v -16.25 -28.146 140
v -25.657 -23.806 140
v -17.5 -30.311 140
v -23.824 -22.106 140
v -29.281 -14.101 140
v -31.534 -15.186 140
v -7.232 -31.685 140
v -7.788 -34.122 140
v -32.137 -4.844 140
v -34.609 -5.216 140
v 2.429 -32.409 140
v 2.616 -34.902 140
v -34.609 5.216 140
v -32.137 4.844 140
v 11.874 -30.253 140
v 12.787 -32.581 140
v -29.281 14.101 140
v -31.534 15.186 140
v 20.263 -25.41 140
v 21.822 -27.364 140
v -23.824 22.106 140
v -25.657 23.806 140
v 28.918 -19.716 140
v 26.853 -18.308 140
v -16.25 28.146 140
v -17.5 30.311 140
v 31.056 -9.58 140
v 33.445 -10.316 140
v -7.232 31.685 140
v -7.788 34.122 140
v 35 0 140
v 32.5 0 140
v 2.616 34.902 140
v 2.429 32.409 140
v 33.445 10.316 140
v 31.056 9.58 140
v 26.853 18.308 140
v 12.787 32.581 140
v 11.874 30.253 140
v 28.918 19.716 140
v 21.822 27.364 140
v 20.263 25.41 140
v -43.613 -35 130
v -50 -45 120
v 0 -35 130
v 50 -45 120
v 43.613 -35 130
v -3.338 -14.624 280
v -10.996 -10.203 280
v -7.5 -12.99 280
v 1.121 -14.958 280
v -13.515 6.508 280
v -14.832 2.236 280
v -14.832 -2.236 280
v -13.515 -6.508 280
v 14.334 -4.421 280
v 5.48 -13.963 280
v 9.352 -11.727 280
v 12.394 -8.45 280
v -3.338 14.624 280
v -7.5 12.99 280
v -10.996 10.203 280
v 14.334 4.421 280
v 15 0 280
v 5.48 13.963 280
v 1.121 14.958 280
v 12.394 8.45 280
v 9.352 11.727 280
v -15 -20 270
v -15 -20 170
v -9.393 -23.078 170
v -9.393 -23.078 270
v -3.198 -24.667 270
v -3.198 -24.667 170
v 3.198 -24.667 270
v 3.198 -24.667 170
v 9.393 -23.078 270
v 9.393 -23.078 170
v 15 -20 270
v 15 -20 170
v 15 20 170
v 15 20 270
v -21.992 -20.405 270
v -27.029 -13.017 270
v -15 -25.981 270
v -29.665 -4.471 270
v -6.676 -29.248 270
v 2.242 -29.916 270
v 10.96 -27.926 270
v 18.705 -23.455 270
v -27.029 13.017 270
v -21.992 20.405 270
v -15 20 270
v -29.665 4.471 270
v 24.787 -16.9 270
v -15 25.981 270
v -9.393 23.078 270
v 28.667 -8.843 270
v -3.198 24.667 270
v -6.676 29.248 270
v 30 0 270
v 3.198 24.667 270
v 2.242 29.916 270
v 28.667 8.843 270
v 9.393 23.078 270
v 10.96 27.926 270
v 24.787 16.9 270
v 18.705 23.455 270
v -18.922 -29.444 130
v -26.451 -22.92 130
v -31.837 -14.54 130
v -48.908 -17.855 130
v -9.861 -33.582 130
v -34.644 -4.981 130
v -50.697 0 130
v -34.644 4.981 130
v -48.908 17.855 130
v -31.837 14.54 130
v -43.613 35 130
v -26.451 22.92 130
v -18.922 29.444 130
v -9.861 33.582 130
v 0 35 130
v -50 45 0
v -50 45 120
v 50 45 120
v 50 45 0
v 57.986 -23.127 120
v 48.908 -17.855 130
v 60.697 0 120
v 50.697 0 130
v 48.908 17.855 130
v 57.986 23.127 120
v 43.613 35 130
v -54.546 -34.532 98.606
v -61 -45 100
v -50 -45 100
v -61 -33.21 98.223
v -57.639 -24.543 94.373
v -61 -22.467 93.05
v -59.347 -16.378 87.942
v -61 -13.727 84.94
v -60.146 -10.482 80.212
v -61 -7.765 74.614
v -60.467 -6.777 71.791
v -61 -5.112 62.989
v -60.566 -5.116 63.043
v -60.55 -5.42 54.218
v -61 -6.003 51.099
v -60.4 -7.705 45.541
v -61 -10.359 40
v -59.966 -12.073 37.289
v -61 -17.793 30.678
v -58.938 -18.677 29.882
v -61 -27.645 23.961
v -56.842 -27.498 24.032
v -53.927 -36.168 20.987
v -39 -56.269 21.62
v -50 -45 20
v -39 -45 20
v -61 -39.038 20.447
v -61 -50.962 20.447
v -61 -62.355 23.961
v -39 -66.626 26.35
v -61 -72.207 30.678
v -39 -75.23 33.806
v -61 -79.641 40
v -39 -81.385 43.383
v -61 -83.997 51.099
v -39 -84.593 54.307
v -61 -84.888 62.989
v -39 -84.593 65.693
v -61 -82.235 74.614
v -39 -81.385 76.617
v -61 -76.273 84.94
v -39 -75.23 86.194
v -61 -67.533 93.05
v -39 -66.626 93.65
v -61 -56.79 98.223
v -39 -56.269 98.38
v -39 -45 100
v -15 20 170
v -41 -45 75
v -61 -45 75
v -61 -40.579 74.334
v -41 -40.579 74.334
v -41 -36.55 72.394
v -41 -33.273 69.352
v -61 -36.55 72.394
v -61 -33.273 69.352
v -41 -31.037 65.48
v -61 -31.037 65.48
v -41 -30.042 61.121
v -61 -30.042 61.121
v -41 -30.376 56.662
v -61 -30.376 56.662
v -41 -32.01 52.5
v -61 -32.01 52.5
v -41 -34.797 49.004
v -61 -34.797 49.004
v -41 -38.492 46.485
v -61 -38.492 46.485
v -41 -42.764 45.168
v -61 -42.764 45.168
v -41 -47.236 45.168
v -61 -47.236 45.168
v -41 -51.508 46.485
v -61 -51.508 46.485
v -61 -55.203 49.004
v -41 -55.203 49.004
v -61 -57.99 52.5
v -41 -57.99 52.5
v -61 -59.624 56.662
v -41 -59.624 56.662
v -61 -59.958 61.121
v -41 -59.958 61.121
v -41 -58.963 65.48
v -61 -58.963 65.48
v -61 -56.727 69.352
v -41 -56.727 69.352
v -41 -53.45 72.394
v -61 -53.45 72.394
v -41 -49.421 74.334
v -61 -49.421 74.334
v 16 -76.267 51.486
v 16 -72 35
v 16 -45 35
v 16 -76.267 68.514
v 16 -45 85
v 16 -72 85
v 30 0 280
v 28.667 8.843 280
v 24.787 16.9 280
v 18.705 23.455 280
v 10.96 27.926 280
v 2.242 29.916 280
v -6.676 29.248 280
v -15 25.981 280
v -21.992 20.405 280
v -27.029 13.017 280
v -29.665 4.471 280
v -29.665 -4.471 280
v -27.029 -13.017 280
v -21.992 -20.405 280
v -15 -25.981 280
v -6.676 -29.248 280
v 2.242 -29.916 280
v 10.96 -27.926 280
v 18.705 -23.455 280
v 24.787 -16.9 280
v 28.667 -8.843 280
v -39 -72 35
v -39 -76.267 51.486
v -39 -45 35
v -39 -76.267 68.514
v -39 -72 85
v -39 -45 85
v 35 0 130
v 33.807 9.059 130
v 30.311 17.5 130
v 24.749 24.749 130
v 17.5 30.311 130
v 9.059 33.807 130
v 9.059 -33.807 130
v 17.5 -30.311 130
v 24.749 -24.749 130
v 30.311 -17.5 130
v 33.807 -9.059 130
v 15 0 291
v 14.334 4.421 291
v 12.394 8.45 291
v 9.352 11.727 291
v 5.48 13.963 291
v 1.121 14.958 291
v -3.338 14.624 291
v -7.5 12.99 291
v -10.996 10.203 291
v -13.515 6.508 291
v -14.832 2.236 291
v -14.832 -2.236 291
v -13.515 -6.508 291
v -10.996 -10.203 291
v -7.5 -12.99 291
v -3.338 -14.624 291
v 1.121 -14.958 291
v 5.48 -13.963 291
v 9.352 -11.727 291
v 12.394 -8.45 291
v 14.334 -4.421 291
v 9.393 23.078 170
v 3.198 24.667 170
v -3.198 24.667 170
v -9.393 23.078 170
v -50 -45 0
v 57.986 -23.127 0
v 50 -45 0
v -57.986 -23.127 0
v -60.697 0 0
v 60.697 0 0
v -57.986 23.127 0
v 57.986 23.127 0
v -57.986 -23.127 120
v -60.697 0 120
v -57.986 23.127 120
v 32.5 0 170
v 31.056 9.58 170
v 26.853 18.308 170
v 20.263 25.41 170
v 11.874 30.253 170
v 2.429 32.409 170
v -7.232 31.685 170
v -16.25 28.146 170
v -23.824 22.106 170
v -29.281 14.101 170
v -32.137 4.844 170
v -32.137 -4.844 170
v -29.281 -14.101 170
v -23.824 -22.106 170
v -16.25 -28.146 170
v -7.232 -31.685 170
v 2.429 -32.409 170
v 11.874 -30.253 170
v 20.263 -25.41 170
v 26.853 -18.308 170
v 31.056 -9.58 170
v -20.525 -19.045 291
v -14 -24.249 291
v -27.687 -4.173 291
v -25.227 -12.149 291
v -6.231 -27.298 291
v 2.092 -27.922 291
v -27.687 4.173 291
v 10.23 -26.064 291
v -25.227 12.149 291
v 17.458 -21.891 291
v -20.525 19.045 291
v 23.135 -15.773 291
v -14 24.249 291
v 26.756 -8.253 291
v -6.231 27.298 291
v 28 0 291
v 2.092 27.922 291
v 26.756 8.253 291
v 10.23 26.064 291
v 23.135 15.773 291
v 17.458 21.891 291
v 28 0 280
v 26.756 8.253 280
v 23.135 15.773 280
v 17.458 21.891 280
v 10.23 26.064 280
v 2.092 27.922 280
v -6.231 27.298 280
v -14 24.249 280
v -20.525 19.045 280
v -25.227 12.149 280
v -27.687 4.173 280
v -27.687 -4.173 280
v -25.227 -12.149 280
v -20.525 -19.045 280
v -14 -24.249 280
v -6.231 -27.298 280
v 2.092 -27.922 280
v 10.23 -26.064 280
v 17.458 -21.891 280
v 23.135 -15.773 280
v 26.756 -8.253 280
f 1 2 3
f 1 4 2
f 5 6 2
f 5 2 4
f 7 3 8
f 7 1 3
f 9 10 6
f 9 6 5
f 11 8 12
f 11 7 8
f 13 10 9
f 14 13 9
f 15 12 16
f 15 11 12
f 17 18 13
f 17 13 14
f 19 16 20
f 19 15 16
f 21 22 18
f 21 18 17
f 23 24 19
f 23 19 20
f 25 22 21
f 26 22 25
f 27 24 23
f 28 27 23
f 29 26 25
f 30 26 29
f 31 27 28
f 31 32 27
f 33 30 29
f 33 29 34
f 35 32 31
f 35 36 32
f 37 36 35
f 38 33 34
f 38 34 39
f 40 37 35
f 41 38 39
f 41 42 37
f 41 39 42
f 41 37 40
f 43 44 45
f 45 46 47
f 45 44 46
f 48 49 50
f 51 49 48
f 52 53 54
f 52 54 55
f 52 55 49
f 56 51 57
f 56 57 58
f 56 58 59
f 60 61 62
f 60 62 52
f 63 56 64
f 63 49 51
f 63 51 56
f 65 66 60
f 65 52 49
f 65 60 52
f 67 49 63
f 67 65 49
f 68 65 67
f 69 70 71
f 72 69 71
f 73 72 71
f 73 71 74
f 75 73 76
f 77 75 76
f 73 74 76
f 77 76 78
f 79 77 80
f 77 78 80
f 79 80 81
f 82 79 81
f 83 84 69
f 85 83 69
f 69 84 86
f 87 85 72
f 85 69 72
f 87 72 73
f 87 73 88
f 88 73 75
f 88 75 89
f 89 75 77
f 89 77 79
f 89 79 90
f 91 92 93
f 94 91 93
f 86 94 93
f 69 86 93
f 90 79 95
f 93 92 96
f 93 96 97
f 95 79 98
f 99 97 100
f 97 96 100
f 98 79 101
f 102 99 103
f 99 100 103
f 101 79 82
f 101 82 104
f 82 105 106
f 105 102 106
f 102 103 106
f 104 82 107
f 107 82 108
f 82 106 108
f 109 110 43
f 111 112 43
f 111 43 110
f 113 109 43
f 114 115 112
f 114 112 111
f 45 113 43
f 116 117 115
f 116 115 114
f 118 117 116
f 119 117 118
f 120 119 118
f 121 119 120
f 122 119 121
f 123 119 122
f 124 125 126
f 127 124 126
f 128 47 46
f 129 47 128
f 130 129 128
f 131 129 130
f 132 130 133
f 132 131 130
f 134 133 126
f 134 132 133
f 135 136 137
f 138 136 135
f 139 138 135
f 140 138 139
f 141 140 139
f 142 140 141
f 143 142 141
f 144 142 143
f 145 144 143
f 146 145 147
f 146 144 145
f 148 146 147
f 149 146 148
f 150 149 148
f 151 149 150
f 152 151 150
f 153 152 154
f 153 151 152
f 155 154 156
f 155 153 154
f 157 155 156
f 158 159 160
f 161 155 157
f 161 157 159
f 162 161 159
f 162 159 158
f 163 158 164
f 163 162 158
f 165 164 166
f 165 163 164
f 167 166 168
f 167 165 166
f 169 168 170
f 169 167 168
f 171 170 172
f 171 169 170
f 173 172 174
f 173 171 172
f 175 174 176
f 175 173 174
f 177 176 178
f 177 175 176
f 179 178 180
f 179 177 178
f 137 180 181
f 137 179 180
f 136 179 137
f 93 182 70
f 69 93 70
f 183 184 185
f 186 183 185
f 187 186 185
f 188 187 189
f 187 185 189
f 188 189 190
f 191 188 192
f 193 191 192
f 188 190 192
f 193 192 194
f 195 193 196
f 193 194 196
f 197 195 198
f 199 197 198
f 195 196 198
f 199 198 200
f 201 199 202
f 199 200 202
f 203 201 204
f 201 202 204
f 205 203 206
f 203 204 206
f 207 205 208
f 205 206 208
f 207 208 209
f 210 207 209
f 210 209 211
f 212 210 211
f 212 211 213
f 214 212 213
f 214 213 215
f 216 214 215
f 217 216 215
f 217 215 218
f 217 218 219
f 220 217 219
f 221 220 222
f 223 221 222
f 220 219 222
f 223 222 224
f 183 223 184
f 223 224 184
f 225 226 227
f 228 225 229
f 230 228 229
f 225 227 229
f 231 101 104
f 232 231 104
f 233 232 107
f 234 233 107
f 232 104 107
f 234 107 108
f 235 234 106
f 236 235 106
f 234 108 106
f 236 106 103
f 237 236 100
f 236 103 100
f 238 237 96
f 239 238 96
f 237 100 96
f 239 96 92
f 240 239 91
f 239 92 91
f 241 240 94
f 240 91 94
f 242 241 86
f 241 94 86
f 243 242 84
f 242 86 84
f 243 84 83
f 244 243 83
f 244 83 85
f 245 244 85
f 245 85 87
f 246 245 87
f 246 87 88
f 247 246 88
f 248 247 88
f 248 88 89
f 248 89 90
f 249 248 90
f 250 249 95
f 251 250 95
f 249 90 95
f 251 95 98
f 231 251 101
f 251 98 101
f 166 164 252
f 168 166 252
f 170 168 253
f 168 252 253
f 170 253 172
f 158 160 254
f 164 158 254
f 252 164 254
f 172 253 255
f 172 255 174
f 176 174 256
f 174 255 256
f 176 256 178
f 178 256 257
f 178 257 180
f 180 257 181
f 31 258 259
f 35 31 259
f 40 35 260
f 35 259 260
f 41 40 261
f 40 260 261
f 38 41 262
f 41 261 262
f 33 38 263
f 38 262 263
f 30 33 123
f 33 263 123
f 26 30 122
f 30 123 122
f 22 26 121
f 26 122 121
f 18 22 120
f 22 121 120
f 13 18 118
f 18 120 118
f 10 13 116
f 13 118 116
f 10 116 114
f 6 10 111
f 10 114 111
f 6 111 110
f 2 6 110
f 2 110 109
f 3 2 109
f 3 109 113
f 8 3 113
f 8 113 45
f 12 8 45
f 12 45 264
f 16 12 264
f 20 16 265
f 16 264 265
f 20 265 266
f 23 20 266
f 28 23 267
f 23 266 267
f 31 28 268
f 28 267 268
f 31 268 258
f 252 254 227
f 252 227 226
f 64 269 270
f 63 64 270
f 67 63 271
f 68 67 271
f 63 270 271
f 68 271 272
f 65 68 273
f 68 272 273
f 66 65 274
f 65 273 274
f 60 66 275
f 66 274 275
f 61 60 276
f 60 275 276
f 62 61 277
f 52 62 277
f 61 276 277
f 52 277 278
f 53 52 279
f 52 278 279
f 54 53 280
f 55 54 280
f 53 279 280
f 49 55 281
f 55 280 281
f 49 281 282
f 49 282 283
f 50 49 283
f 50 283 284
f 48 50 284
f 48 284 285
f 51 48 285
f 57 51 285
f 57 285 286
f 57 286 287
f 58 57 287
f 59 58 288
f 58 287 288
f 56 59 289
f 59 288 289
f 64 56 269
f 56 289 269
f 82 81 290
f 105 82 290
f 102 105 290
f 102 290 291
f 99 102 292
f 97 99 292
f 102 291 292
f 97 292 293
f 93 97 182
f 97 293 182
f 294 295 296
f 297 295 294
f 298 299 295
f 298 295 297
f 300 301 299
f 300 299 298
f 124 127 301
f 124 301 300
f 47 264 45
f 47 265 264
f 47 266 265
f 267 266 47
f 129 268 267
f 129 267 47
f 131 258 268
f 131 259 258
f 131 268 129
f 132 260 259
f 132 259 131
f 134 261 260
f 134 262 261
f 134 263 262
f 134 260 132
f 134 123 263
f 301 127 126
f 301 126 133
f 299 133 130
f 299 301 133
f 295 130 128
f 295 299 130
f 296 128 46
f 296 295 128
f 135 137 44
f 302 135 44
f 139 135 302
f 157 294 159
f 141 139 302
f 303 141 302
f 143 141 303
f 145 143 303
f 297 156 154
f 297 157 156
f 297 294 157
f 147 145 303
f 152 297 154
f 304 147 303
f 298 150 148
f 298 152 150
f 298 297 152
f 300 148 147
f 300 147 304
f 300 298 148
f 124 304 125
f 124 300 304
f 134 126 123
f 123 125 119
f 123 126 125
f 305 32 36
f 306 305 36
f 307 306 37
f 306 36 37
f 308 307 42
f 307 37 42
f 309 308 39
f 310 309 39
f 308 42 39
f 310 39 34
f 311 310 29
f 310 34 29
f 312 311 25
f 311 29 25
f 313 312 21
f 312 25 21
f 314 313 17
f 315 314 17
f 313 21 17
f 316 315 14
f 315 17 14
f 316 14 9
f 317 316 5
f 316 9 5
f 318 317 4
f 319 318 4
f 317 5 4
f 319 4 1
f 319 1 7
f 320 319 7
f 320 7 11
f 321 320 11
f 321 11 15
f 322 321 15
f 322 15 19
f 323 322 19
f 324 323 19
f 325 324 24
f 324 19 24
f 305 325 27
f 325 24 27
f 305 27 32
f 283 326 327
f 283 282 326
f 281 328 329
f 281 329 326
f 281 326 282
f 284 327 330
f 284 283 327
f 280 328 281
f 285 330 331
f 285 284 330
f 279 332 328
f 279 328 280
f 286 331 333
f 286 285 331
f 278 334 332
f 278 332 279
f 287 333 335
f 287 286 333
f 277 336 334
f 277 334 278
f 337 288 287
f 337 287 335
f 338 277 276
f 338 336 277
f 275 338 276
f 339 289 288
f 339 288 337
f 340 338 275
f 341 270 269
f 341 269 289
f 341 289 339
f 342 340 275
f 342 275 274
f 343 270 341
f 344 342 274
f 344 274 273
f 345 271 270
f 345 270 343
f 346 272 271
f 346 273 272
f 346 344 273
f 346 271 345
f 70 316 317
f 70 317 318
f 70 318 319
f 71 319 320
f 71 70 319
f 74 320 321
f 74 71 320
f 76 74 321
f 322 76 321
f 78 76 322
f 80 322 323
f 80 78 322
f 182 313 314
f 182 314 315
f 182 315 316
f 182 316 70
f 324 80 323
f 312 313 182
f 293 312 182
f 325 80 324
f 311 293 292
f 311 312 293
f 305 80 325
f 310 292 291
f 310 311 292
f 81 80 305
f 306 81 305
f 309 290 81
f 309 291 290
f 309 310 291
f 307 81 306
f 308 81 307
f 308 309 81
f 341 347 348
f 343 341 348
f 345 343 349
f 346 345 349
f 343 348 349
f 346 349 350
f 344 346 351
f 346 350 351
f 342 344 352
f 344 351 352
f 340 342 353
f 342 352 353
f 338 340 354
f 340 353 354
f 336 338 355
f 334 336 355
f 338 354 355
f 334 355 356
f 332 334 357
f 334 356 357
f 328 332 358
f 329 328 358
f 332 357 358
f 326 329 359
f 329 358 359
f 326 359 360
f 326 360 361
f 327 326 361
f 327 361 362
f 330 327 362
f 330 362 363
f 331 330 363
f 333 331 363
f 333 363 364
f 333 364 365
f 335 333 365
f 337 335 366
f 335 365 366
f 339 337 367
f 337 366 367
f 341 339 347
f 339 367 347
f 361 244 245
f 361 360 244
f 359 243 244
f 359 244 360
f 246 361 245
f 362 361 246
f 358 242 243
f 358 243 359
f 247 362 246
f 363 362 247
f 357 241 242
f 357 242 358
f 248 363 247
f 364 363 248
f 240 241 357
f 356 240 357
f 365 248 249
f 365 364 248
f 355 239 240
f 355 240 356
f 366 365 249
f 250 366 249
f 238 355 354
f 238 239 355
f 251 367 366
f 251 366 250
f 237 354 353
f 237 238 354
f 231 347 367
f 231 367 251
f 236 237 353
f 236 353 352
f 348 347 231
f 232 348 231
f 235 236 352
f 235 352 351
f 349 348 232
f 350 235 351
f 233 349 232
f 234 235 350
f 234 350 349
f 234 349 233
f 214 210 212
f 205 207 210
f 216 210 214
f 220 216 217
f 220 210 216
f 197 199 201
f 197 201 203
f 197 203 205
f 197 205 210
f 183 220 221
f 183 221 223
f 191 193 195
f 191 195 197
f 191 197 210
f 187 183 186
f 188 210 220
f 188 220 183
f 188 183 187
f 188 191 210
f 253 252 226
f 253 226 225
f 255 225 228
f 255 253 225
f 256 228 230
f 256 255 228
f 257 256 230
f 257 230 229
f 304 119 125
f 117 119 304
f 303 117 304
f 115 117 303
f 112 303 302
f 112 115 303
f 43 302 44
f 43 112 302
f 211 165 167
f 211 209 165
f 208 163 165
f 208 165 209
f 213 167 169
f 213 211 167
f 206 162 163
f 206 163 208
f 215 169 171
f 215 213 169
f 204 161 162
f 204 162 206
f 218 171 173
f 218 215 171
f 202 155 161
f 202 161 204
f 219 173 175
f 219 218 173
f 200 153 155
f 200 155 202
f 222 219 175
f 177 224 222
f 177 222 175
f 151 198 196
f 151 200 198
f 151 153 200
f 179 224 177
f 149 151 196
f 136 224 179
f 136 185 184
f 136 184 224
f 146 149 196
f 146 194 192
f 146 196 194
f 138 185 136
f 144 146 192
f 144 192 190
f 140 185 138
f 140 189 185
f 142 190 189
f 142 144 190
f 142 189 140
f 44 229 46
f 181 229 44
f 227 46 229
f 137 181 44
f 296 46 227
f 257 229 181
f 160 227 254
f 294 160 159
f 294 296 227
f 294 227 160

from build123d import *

# Parameters (mm, degrees)
BOSS_EXTRUDE1_DEPTH = 120
BOSS_EXTRUDE2_DEPTH = 10
BOSS_EXTRUDE2_TAPER = 45
SKETCH3_R           = 35
BOSS_EXTRUDE3_DEPTH = 10
SKETCH4_R           = 32.5
BOSS_EXTRUDE4_DEPTH = 30
BOSS_EXTRUDE5_DEPTH = 100
SKETCH6_R           = 30
BOSS_EXTRUDE6_DEPTH = 10
SKETCH7_R           = 28
BOSS_EXTRUDE7_DEPTH = 11
SKETCH8_R           = 40
BOSS_EXTRUDE8_DEPTH = 11
BOSS_EXTRUDE9_DEPTH = 55
SKETCH10_R          = 15
CUT_EXTRUDE1_DEPTH  = 11
SKETCH11_R          = 15
CUT_EXTRUDE2_DEPTH  = 20


with BuildPart() as part:
    # Sketch1 → Boss-Extrude1 (new body)
    with BuildSketch(Plane.XY):
        with BuildLine():
            Line((-50, 45), (50, 45))
            ThreePointArc((50, 45), (60.697144503, 0), (50, -45))
            Line((50, -45), (-50, -45))
            ThreePointArc((-50, -45), (-60.697144503, 0), (-50, 45))
        make_face()
    extrude(amount=BOSS_EXTRUDE1_DEPTH)

    # Sketch2 → Boss-Extrude2 (add)
    with BuildSketch(Plane.XY.offset(120)):
        with BuildLine():
            Line((-50, -45), (50, -45))
            ThreePointArc((50, -45), (60.697144503, 0), (50, 45))
            Line((50, 45), (-50, 45))
            ThreePointArc((-50, 45), (-60.697144503, 0), (-50, -45))
        make_face()
    extrude(amount=BOSS_EXTRUDE2_DEPTH, taper=BOSS_EXTRUDE2_TAPER)

    # Sketch3 → Boss-Extrude3 (add)
    with BuildSketch(Plane.XY.offset(130)):
        Circle(SKETCH3_R)
    extrude(amount=BOSS_EXTRUDE3_DEPTH)

    # Sketch4 → Boss-Extrude4 (add)
    with BuildSketch(Plane.XY.offset(140)):
        Circle(SKETCH4_R)
    extrude(amount=BOSS_EXTRUDE4_DEPTH)

    # Sketch5 → Boss-Extrude5 (add)
    with BuildSketch(Plane.XY.offset(170)):
        with BuildLine():
            Line((-15, 20), (-15, -20))
            ThreePointArc((-15, -20), (0, -24.86796738), (15, -20))
            Line((15, -20), (15, 20))
            ThreePointArc((15, 20), (0, 24.86796738), (-15, 20))
        make_face()
    extrude(amount=BOSS_EXTRUDE5_DEPTH)

    # Sketch6 → Boss-Extrude6 (add)
    with BuildSketch(Plane.XY.offset(270)):
        Circle(SKETCH6_R)
    extrude(amount=BOSS_EXTRUDE6_DEPTH)

    # Sketch7 → Boss-Extrude7 (add)
    with BuildSketch(Plane.XY.offset(280)):
        Circle(SKETCH7_R)
    extrude(amount=BOSS_EXTRUDE7_DEPTH)

    # Sketch8 → Boss-Extrude8 (add, symmetric)
    with BuildSketch(Plane.ZY.offset(50)):
        with Locations((60, -45)):
            Circle(SKETCH8_R)
    extrude(amount=BOSS_EXTRUDE8_DEPTH, both=True)

    # Sketch9 → Boss-Extrude9 (add)
    with BuildSketch(Plane(origin=(-39, 0, 0), x_dir=(0, 0, -1), z_dir=(1, 0, 0))):
        with BuildLine():
            Line((-85, -45), (-35, -45))
            Line((-35, -45), (-35, -72))
            ThreePointArc((-35, -72), (-60, -76.80636081), (-85, -72))
            Line((-85, -72), (-85, -45))
        make_face()
    extrude(amount=BOSS_EXTRUDE9_DEPTH)

    # Sketch10 → Cut-Extrude1 (cut)
    with BuildSketch(Plane.XY.offset(291)):
        Circle(SKETCH10_R)
    extrude(amount=-CUT_EXTRUDE1_DEPTH, mode=Mode.SUBTRACT)

    # Sketch11 → Cut-Extrude2 (cut)
    with BuildSketch(Plane.ZY.offset(61)):
        with Locations((60, -45)):
            Circle(SKETCH11_R)
    extrude(amount=-CUT_EXTRUDE2_DEPTH, mode=Mode.SUBTRACT)


solid = part.part
